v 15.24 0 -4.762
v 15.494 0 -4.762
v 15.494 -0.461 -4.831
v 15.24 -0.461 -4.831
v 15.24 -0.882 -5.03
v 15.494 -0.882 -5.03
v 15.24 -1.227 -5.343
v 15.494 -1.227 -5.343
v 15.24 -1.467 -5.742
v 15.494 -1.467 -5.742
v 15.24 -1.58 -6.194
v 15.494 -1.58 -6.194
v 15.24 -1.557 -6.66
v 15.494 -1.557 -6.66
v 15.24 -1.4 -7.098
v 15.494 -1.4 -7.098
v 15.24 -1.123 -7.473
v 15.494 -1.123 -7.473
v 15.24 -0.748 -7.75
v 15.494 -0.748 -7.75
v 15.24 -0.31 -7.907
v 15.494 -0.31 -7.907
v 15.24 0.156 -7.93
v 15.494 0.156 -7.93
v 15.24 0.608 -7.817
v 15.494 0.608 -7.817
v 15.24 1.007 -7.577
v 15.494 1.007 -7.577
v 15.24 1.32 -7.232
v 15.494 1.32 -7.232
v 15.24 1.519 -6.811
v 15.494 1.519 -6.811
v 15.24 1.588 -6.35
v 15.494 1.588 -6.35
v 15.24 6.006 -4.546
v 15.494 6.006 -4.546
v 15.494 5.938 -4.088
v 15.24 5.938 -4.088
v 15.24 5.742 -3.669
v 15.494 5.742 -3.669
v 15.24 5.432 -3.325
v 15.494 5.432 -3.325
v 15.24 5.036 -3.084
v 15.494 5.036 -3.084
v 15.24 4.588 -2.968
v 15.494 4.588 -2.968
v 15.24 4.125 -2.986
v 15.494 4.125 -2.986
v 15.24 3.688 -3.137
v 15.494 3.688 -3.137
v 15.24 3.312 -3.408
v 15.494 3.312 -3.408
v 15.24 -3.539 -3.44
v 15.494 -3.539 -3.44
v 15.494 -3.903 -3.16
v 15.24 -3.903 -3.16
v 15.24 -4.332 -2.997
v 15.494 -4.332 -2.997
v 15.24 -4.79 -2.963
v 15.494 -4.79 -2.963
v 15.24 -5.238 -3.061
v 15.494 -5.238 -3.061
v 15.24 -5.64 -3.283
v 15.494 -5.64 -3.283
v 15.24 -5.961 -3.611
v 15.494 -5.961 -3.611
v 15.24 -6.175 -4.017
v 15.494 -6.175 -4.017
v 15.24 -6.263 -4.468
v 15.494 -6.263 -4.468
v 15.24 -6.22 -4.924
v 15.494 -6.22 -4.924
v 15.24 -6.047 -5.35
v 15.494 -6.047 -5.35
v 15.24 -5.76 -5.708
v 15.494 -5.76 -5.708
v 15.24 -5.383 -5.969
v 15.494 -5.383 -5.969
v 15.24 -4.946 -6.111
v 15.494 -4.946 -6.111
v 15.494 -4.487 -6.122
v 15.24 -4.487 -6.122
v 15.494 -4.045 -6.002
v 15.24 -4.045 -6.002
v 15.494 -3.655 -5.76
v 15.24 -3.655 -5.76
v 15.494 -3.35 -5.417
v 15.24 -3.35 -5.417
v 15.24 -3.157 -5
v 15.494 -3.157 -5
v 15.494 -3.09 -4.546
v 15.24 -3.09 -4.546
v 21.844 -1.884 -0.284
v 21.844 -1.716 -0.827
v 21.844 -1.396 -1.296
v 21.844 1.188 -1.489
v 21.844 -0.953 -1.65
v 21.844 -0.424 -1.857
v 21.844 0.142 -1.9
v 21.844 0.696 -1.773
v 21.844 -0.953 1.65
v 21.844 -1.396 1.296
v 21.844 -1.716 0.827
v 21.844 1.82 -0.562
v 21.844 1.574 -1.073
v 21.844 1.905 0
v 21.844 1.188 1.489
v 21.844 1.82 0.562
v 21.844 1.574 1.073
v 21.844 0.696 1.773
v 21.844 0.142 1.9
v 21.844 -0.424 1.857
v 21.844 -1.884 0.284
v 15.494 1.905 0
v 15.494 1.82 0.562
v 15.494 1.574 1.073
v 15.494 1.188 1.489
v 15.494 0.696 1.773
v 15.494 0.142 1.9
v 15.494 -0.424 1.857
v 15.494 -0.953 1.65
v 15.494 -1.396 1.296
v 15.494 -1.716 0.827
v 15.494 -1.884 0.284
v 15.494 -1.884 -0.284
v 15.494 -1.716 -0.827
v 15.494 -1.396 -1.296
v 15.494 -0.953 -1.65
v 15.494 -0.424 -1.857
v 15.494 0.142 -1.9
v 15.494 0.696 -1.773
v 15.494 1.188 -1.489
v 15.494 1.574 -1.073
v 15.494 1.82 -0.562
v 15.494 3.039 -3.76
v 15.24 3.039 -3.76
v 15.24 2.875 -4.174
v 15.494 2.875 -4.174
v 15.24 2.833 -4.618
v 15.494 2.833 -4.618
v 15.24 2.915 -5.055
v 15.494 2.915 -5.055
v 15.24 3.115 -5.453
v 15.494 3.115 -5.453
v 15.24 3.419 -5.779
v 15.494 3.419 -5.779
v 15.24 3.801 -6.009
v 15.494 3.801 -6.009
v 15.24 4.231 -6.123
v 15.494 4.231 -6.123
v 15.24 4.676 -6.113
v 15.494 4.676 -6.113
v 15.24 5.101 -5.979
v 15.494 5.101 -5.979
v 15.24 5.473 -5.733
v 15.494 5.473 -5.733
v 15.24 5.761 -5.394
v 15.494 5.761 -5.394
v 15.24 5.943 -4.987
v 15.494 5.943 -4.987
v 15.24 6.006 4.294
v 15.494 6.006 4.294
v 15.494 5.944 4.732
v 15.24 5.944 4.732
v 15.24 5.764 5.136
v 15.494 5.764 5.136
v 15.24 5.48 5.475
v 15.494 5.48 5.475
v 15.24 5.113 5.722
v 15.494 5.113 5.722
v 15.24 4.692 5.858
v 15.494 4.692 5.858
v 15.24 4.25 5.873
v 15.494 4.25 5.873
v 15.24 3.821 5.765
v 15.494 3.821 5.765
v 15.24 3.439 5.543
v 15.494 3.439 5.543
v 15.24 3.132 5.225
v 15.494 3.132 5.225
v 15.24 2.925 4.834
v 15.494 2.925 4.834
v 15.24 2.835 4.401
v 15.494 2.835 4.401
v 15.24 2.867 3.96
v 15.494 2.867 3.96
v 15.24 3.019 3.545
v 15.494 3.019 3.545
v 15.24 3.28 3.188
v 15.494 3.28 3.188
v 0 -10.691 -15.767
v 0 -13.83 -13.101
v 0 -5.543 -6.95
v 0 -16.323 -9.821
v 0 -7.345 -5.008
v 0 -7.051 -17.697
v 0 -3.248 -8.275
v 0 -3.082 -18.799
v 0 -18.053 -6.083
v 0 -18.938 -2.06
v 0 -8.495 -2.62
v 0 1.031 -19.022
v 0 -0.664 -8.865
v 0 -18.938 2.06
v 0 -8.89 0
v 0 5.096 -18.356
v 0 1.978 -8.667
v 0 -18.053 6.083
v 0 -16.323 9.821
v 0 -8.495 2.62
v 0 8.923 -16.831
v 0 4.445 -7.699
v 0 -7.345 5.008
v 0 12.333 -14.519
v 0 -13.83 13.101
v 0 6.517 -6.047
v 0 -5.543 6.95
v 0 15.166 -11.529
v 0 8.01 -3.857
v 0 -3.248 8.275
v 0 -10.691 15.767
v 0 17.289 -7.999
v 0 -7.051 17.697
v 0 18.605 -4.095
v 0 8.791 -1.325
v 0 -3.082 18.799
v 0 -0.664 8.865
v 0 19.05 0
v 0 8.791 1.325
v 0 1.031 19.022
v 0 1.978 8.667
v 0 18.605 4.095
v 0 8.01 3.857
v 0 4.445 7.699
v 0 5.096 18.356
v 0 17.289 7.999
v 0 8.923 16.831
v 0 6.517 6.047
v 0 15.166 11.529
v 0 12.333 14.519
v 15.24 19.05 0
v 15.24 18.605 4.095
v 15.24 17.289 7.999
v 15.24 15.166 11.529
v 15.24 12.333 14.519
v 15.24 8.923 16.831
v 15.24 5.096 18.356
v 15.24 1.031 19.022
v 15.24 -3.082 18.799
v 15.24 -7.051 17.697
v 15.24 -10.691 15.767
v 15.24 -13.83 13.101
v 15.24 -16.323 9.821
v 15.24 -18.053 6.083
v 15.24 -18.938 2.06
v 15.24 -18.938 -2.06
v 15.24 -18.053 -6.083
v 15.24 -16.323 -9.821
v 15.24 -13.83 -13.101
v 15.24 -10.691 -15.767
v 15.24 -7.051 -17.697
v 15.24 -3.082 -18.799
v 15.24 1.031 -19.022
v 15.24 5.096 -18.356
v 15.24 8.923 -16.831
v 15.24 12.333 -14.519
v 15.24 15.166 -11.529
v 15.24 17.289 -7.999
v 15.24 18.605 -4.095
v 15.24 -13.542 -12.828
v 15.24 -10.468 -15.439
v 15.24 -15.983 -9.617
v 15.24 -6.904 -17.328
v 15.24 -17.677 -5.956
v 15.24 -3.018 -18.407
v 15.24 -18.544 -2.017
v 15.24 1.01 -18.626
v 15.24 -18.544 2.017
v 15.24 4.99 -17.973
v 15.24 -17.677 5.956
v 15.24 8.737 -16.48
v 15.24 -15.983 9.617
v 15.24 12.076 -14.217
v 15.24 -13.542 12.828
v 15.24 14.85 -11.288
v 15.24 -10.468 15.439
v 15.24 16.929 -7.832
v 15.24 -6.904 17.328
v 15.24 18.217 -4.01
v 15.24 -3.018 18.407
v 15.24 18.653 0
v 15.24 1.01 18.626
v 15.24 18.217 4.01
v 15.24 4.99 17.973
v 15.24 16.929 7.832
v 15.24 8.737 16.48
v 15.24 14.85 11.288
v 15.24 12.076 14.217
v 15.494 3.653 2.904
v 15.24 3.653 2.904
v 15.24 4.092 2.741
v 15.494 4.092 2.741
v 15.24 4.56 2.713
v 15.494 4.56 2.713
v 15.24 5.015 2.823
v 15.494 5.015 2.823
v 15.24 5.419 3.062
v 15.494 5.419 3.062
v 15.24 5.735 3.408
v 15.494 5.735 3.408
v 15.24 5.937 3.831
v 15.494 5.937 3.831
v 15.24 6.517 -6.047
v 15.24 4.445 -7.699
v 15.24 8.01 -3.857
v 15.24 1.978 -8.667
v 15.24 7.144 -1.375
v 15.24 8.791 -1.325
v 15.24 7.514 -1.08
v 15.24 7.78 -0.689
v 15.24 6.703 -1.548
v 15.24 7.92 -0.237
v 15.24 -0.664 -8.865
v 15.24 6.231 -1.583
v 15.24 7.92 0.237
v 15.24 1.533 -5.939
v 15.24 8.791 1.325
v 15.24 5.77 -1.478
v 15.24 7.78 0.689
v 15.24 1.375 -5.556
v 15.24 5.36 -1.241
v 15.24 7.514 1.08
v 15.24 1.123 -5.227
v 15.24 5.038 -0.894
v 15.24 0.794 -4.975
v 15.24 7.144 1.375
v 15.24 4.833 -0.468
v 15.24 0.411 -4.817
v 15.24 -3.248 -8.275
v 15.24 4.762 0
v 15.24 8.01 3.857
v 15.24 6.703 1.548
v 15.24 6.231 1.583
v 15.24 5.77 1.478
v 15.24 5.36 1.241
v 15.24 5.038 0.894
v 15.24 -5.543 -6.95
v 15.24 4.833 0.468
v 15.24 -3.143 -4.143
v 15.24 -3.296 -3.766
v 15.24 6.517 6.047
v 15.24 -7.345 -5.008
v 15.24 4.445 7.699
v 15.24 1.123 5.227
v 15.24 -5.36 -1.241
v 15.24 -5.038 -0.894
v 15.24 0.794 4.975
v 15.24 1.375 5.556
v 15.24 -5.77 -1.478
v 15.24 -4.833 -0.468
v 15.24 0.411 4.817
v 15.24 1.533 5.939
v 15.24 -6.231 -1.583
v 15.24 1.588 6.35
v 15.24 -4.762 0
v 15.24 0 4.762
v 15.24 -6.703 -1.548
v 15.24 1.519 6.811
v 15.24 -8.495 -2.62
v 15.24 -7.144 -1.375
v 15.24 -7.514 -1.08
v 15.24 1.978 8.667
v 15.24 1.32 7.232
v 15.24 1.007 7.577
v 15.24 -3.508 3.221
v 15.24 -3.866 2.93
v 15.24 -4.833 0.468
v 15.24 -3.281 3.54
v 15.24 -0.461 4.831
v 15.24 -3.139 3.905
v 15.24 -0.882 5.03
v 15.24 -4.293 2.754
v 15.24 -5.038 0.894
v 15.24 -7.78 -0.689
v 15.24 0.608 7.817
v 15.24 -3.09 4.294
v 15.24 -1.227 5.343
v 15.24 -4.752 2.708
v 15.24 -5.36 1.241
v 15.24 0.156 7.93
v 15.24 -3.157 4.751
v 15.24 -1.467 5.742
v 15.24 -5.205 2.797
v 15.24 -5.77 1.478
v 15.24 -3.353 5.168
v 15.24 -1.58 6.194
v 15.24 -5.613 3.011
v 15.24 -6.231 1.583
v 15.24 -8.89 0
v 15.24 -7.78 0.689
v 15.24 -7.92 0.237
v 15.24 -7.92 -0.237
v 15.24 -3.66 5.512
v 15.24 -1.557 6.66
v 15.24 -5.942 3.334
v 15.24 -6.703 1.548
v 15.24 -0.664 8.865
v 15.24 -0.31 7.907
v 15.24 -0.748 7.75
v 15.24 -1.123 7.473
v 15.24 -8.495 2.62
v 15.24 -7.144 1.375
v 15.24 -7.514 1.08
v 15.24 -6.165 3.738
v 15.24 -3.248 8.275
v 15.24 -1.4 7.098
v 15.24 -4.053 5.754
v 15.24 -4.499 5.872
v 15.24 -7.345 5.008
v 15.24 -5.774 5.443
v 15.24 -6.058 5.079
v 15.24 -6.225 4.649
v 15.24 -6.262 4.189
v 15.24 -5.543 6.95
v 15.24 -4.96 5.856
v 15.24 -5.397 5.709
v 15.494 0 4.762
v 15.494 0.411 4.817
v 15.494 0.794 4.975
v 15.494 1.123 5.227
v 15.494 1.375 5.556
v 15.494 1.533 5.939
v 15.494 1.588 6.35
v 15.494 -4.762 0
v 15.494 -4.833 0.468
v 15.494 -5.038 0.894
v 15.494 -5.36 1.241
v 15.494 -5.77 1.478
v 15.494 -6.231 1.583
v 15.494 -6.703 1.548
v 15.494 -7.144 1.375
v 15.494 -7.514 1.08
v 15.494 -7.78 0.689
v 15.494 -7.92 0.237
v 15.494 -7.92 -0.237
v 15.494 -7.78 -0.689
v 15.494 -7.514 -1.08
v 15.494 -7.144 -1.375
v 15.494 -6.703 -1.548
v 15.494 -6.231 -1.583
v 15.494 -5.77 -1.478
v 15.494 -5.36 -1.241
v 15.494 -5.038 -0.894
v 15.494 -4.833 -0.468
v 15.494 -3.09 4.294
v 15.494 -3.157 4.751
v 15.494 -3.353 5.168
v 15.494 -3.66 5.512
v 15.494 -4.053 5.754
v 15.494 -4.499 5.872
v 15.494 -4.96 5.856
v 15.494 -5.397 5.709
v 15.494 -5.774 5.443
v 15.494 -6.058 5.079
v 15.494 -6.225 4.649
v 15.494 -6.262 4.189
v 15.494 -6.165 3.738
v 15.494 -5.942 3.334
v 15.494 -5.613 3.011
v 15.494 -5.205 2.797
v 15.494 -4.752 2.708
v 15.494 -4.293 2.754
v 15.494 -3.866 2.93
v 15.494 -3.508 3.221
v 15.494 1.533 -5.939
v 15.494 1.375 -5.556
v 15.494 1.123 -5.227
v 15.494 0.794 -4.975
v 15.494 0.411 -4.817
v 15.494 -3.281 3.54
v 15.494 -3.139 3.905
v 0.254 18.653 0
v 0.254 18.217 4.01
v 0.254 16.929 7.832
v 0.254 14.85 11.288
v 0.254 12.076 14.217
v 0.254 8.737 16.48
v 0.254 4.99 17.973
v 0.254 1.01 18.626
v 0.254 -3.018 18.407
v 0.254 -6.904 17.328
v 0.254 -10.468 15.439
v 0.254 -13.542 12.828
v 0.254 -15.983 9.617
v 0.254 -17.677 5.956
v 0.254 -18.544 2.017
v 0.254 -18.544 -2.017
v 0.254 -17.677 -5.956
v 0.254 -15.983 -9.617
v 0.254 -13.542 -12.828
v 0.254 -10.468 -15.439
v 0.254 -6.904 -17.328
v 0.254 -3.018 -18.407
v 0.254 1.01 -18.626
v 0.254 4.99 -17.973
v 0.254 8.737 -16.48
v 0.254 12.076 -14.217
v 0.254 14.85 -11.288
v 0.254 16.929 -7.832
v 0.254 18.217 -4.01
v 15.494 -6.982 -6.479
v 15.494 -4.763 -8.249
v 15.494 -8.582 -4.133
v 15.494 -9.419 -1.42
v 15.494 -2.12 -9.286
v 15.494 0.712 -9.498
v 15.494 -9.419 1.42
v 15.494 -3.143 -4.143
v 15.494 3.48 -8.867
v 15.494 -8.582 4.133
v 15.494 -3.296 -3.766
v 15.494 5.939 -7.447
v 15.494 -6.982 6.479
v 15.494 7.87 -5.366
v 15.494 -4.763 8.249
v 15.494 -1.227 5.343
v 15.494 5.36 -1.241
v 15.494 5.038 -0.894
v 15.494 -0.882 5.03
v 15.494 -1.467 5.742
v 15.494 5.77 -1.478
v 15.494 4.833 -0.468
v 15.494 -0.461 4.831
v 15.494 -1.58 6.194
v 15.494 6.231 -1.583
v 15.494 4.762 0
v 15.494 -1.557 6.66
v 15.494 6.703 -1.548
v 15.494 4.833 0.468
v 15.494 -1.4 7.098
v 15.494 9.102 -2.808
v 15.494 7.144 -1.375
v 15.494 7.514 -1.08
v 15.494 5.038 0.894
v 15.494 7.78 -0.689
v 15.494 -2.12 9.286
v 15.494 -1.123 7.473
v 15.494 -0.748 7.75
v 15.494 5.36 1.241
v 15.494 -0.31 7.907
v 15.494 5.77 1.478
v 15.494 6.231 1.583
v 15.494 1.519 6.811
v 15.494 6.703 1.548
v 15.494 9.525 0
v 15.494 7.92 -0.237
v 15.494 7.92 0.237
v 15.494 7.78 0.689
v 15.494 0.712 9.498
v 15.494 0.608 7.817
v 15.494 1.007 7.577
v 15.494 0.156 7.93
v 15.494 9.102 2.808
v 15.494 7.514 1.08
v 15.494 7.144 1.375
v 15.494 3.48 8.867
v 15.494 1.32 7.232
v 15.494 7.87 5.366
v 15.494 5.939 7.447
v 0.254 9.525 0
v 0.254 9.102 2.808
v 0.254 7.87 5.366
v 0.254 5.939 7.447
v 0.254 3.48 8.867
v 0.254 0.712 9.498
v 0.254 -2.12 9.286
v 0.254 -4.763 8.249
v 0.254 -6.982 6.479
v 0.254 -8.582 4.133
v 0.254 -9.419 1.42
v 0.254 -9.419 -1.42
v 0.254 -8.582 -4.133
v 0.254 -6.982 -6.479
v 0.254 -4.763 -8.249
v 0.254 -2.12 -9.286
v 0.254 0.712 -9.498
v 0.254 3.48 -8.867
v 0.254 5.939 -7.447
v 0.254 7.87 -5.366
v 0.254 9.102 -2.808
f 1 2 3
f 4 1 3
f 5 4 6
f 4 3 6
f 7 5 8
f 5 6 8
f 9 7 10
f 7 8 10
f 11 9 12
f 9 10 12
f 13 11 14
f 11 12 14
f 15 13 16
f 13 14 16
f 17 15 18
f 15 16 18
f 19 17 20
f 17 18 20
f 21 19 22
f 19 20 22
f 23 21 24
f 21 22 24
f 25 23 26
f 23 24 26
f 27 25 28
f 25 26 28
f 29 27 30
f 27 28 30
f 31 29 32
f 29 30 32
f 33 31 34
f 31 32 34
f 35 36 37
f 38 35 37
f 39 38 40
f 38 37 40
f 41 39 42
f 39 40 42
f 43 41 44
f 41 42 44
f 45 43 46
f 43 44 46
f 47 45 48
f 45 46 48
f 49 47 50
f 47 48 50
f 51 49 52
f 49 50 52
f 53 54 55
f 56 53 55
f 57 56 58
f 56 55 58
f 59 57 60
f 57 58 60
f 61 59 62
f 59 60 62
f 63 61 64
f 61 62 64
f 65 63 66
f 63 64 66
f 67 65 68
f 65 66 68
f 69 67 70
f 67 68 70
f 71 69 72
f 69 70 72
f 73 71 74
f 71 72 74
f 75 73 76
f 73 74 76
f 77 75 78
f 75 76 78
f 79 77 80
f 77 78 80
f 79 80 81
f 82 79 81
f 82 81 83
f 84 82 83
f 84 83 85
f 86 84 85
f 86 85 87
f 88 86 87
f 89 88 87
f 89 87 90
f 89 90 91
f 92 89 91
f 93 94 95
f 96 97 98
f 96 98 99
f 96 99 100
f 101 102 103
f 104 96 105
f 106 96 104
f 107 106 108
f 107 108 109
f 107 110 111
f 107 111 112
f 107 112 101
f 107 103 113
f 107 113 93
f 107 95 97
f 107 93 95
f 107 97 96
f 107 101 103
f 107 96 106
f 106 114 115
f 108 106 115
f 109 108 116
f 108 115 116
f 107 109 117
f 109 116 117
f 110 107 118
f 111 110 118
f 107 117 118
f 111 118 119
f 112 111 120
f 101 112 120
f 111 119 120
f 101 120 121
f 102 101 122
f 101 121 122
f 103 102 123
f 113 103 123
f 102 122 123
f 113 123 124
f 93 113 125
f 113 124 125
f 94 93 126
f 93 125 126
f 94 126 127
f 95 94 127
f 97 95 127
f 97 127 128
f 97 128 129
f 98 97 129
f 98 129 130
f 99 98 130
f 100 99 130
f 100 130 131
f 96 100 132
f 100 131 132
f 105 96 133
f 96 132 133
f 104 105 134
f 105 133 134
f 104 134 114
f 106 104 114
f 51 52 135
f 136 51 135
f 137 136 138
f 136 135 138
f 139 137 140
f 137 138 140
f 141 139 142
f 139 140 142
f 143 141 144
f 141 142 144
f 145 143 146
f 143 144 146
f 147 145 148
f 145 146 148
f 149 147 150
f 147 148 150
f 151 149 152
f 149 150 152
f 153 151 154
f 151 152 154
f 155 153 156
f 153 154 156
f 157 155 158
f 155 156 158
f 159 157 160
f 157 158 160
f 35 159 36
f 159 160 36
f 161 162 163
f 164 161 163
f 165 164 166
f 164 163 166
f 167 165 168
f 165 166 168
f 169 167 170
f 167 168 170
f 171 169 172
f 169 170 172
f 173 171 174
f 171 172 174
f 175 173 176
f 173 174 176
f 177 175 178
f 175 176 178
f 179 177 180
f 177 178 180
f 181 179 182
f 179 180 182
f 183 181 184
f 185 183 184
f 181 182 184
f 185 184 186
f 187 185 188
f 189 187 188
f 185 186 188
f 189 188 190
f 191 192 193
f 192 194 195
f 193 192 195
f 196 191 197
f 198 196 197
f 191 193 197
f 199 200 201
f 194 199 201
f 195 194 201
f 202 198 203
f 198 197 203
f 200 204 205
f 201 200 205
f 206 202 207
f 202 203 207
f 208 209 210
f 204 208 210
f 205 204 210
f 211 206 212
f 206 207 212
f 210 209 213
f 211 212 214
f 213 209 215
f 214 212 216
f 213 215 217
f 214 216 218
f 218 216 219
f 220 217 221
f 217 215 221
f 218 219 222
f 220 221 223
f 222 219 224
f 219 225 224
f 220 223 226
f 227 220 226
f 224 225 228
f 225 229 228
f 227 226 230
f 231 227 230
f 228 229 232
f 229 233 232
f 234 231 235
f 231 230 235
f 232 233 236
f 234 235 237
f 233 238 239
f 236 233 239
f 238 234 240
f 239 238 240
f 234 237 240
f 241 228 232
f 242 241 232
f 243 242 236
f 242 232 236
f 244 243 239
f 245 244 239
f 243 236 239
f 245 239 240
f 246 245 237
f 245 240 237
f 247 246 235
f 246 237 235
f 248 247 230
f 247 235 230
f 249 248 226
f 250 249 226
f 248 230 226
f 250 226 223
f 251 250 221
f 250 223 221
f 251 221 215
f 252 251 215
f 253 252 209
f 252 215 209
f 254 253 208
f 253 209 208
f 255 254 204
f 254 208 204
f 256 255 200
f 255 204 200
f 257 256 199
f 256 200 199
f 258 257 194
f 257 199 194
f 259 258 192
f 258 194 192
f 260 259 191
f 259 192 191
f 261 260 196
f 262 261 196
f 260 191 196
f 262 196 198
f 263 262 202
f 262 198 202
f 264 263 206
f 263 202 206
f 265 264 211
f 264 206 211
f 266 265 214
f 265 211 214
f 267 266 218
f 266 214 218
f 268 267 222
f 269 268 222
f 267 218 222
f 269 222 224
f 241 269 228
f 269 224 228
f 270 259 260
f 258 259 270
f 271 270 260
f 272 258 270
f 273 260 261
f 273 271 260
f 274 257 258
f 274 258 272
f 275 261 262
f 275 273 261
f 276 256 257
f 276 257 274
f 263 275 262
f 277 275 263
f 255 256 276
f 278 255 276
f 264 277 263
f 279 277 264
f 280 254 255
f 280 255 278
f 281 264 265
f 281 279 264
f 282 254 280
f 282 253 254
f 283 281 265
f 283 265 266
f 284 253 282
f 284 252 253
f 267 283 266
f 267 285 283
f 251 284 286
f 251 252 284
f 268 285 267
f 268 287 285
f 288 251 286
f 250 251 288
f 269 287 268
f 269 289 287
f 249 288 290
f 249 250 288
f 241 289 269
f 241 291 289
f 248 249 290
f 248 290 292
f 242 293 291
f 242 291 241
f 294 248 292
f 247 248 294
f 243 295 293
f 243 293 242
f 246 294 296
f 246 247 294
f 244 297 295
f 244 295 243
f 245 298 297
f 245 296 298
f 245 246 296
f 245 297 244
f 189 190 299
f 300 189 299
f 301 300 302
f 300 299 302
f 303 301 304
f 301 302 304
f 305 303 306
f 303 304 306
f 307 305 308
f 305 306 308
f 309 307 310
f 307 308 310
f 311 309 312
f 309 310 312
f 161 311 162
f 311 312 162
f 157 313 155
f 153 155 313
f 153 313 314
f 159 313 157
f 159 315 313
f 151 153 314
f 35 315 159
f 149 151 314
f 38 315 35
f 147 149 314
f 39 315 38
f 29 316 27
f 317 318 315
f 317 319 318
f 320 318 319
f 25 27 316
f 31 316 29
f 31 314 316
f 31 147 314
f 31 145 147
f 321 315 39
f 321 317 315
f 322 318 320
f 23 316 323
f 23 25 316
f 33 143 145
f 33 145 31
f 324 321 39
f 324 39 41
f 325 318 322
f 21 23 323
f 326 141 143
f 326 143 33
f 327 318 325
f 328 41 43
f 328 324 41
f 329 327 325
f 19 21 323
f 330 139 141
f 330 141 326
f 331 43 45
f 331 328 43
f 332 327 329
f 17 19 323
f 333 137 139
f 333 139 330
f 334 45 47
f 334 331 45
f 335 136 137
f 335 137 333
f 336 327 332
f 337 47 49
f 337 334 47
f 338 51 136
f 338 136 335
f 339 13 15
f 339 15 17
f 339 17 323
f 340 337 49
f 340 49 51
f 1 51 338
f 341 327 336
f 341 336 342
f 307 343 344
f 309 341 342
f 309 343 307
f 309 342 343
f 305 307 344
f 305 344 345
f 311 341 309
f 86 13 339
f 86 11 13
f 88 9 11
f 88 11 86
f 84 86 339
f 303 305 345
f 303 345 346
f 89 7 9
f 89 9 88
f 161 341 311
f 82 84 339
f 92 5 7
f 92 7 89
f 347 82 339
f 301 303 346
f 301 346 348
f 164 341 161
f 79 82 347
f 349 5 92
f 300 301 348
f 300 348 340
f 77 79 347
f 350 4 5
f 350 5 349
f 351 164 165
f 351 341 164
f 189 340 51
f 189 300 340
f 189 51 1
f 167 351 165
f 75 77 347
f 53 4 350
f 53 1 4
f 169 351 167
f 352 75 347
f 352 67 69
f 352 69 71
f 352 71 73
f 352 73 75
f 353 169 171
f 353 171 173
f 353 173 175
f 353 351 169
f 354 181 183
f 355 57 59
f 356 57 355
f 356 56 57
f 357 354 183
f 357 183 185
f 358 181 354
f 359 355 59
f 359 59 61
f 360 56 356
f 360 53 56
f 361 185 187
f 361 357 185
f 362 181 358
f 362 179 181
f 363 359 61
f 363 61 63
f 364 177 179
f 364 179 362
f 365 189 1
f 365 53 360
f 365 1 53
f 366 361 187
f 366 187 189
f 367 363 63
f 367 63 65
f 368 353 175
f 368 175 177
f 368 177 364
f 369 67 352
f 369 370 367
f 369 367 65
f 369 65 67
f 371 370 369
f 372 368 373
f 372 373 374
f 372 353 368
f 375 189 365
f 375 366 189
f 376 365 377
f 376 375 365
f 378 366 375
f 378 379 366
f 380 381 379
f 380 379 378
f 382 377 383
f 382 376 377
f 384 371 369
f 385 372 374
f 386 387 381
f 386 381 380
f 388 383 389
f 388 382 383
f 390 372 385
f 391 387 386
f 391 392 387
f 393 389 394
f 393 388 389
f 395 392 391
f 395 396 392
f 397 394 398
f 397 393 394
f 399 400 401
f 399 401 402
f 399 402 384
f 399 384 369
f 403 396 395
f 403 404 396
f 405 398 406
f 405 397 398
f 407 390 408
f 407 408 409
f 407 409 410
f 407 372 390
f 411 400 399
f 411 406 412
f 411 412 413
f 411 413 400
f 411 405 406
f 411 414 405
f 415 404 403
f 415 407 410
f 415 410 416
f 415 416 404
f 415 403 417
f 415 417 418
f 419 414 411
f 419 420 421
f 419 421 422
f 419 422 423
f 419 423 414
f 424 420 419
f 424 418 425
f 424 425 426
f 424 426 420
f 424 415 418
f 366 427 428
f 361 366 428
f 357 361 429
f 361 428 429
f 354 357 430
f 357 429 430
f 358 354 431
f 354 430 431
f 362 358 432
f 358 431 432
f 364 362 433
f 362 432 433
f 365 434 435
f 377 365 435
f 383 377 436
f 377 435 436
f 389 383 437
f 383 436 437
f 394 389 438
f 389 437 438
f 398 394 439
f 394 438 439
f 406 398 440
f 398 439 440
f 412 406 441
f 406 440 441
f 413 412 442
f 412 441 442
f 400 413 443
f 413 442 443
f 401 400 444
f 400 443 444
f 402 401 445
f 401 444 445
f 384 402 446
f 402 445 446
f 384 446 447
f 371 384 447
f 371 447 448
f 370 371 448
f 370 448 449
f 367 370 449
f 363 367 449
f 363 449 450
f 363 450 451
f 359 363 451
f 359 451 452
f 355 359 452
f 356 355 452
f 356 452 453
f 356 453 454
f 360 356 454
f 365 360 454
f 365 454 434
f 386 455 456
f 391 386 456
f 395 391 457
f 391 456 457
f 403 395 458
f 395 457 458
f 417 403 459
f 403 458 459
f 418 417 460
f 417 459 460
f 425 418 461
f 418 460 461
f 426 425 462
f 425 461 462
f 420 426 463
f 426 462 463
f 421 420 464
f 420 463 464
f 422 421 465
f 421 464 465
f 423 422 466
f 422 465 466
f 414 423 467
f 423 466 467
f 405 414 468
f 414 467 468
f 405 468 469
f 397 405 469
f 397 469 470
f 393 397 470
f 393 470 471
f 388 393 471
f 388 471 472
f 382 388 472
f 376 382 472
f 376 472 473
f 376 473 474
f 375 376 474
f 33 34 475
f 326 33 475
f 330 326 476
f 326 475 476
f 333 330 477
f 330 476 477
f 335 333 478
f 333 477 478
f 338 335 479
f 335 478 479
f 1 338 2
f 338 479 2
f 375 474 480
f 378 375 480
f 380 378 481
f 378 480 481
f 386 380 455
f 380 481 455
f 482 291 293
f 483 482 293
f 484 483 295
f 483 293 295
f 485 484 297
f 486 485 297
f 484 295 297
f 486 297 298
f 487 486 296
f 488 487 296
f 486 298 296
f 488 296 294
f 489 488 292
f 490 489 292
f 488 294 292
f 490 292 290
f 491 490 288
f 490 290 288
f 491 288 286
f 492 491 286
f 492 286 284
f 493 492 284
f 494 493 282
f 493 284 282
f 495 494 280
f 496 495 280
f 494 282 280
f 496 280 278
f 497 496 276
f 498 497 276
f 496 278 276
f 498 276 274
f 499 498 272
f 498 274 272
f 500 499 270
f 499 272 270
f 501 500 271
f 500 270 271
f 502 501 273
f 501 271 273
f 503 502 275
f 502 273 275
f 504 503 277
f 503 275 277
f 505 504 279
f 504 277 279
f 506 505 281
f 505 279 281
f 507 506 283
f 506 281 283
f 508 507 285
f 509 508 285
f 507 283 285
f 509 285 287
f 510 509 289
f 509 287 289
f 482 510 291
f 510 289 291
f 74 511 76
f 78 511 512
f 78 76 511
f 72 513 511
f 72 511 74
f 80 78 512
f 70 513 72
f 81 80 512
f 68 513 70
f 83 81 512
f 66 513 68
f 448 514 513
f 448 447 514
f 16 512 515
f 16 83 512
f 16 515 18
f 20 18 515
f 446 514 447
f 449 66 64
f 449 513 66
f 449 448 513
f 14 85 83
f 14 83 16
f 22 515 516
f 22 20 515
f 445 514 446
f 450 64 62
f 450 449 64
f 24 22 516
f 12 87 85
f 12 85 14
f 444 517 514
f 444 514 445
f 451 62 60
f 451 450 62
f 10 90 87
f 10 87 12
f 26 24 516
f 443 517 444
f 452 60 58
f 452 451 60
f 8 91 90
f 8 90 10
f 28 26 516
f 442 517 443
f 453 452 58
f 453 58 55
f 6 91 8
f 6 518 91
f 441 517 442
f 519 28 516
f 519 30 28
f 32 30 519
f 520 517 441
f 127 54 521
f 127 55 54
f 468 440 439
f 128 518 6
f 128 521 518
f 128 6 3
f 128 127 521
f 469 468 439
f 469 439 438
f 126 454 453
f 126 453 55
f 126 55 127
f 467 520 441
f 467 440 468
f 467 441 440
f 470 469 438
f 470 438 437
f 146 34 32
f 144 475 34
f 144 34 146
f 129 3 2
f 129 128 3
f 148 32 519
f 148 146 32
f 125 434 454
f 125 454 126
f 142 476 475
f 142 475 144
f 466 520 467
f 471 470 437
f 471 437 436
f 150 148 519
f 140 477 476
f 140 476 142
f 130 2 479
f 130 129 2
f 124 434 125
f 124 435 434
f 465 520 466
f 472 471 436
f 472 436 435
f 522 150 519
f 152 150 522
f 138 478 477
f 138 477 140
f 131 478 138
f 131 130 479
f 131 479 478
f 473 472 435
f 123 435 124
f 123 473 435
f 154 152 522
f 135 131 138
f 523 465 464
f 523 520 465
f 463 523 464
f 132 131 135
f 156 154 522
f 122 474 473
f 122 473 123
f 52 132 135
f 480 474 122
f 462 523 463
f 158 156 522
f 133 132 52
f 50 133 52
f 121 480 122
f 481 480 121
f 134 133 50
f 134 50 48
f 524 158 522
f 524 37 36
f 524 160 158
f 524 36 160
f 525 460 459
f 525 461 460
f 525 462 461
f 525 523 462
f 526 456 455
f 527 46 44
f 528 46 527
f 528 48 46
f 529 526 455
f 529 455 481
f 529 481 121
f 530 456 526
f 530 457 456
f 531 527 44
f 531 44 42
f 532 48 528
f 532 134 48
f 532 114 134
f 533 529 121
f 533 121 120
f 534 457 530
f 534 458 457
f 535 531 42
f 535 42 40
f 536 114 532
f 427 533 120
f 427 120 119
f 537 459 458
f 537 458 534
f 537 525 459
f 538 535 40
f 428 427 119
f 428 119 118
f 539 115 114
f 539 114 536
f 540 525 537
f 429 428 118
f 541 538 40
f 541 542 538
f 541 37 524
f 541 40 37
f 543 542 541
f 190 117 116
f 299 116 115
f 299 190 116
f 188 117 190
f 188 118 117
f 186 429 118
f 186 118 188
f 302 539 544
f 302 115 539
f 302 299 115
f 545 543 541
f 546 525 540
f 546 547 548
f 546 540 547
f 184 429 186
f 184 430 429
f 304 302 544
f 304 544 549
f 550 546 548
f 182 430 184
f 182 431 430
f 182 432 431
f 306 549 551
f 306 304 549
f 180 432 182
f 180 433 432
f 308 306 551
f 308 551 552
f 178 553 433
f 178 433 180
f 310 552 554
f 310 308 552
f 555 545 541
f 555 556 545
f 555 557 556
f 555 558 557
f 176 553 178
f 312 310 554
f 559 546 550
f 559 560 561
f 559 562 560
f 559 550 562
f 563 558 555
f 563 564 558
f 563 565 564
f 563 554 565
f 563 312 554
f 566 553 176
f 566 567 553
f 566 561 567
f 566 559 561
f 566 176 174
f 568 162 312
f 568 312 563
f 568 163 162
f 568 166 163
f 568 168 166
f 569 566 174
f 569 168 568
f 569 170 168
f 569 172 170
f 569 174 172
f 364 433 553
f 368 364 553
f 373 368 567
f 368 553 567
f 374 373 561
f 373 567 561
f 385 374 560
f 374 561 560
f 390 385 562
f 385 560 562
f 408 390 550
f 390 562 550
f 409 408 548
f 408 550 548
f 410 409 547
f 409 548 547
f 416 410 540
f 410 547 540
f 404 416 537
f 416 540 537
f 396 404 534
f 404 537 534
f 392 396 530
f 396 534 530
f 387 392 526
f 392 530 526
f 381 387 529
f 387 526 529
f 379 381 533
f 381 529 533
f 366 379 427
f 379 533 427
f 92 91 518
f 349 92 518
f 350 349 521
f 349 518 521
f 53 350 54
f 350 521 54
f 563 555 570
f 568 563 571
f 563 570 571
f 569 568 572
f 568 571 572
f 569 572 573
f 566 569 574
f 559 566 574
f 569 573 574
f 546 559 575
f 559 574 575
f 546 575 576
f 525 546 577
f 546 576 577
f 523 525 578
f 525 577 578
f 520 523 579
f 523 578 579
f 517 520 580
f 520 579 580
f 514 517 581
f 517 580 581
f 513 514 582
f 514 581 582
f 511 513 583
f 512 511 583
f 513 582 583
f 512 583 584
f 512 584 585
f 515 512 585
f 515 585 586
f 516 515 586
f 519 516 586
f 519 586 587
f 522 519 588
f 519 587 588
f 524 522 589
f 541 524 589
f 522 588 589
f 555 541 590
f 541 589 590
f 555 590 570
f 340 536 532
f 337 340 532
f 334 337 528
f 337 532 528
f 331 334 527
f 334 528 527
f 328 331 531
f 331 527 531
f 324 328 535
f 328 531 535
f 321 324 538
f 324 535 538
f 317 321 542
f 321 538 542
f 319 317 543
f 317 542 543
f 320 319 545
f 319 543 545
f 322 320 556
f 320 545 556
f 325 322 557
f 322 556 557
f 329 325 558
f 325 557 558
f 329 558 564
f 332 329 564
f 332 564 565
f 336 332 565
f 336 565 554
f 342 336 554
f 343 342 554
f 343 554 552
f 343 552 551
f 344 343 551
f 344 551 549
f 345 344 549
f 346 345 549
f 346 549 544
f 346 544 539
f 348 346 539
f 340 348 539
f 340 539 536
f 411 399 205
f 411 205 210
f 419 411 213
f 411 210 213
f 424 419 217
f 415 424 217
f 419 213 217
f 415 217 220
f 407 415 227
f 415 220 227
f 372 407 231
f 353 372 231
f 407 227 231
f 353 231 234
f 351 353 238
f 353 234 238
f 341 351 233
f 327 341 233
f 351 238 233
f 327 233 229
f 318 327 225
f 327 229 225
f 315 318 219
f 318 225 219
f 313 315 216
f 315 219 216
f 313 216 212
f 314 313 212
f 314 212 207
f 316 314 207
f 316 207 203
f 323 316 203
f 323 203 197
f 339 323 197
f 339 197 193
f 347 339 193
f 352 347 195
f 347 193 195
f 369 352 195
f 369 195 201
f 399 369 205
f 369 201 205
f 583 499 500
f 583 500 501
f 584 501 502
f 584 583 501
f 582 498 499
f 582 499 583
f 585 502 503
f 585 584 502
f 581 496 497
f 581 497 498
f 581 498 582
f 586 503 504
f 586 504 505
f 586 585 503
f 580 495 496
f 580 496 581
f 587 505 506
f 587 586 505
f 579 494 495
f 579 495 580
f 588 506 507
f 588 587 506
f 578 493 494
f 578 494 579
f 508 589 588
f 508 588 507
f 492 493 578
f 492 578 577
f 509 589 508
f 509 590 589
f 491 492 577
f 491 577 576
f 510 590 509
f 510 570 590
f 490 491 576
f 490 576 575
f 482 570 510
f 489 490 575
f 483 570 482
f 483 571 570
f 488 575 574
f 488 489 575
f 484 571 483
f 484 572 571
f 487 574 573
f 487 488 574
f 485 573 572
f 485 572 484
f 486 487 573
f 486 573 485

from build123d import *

# Parameters (mm, degrees)
F0_R      = 19.05
F1_DEPTH  = 15.24
F2_R      = 18.653125
F3_DEPTH  = 14.986
F4_R      = 9.525
F5_DEPTH  = 15.24
F7_R      = 1.5875
F8_DEPTH  = 2.54
F9_R      = 8.89
F10_DEPTH = 15.24
F11_R     = 1.905
F12_DEPTH = 6.35


# Not quite as in the source:
# - a feature names something its author has since deleted; it is built from what else it names


with BuildPart() as f1:
    # F0 (on Right) → F1 (new body)
    with BuildSketch(Plane.YZ):
        Circle(F0_R)
    extrude(amount=F1_DEPTH)

    # F2 (on face) → F3 (cut)
    with BuildSketch(Plane.YZ.offset(15.24)):
        Circle(F2_R)
    extrude(amount=-F3_DEPTH, mode=Mode.SUBTRACT)

    # F4 (on face) → F5 (join)
    with BuildSketch(Plane.YZ.offset(0.254)):
        Circle(F4_R)
    extrude(amount=F5_DEPTH)

    # F7 (on face) → F8 (cut)
    with BuildSketch(Plane.YZ.offset(15.494)):
        with BuildLine():
            ThreePointArc((1.5875, 6.35), (-1.1225320151, 7.4725320151), (0, 4.7625))
            ThreePointArc((0, 4.7625), (1.1225320151, 5.2274679849), (1.5875, 6.35))
        make_face()
        with BuildLine():
            ThreePointArc((7.9375, 0), (6.35, 1.5875), (4.7625, 0))
            ThreePointArc((4.7625, 0), (6.35, -1.5875), (7.9375, 0))
        make_face()
        with BuildLine():
            ThreePointArc((1.5875, -6.35), (1.1225320151, -5.2274679849), (0, -4.7625))
            ThreePointArc((0, -4.7625), (-1.1225320151, -7.4725320151), (1.5875, -6.35))
        make_face()
        with Locations((-6.35, 0)):
            Circle(F7_R)
        with BuildLine():
            ThreePointArc((6.0059587639, 4.2942080269), (3.8214214188, 5.7651610032), (3.2800341547, 3.187796865))
            ThreePointArc((3.2800341547, 3.187796865), (5.015496109, 2.8232550506), (6.0059587639, 4.2942080269))
        make_face()
        with BuildLine():
            ThreePointArc((6.0059587639, -4.5463046331), (5.0364104329, -3.0840146534), (3.312047602, -3.4078800239))
            ThreePointArc((3.312047602, -3.4078800239), (3.8005070949, -6.0085946128), (6.0059587639, -4.5463046331))
        make_face()
        with BuildLine():
            ThreePointArc((-3.0903496579, -4.5463046331), (-3.2068966816, -3.949267288), (-3.5394250487, -3.4398934712))
            ThreePointArc((-3.5394250487, -3.4398934712), (-6.1488026342, -5.1433419782), (-3.0903496579, -4.5463046331))
        make_face()
        with BuildLine():
            ThreePointArc((-3.0903496579, 4.2942080269), (-6.157153182, 4.8702439055), (-3.5083872434, 3.2206560202))
            ThreePointArc((-3.5083872434, 3.2206560202), (-3.1985461338, 3.7181721482), (-3.0903496579, 4.2942080269))
        make_face()
    extrude(amount=-F8_DEPTH, mode=Mode.SUBTRACT)

    # F9 (on face) → F10 (cut)
    with BuildSketch(Plane(origin=(0, 0, 0), x_dir=(0, -1, 0), z_dir=(-1, 0, 0))):
        Circle(F9_R)
    extrude(amount=-F10_DEPTH, mode=Mode.SUBTRACT)

    # F11 (on face) → F12 (join)
    with BuildSketch(Plane.YZ.offset(15.494)):
        Circle(F11_R)
    extrude(amount=F12_DEPTH)


solid = f1.part
